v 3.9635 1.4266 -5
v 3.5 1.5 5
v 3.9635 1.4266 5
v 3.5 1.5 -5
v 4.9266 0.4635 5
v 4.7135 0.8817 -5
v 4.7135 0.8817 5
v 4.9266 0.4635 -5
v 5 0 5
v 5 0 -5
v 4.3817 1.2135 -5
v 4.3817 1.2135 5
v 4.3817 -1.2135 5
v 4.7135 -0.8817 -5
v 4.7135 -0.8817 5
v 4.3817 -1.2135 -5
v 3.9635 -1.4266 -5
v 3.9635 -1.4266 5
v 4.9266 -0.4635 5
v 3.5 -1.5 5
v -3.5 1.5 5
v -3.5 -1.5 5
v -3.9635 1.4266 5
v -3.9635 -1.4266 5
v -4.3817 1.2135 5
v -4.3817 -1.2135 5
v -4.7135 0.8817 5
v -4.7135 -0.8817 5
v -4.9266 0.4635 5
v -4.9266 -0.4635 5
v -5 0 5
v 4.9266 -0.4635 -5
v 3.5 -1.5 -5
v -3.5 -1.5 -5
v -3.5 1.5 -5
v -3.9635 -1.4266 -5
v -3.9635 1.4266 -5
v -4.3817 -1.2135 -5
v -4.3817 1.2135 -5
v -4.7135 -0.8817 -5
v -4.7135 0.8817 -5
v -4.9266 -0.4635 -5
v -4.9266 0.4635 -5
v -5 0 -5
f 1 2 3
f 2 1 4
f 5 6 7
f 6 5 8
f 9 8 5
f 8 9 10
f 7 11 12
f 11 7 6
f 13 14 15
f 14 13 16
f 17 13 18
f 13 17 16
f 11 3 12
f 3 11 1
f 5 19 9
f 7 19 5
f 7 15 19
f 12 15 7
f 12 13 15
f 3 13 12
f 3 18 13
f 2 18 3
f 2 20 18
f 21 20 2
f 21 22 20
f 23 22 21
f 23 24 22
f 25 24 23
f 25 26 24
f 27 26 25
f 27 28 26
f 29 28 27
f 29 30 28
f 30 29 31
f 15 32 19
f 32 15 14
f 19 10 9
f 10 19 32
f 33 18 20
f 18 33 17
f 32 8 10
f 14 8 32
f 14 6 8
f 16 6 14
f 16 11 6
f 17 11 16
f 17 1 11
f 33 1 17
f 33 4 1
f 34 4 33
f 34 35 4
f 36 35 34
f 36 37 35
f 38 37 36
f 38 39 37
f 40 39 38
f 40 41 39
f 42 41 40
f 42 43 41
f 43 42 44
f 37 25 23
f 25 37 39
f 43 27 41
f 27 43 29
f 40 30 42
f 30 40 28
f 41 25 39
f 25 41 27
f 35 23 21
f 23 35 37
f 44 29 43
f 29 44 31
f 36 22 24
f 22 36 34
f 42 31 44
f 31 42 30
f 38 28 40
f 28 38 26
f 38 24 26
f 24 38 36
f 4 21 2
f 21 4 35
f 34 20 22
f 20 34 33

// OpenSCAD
$fn = 20;

module screw_slot(width = 3, length = 10, depth = 10) {
  translate([(length - width) / 2, 0, 0])
    cylinder(d = width, h = depth, center = true);
  translate([- (length - width) / 2, 0, 0])
    cylinder(d = width, h = depth, center = true);
  cube([length - width, width, depth], center = true);
}

screw_slot();
